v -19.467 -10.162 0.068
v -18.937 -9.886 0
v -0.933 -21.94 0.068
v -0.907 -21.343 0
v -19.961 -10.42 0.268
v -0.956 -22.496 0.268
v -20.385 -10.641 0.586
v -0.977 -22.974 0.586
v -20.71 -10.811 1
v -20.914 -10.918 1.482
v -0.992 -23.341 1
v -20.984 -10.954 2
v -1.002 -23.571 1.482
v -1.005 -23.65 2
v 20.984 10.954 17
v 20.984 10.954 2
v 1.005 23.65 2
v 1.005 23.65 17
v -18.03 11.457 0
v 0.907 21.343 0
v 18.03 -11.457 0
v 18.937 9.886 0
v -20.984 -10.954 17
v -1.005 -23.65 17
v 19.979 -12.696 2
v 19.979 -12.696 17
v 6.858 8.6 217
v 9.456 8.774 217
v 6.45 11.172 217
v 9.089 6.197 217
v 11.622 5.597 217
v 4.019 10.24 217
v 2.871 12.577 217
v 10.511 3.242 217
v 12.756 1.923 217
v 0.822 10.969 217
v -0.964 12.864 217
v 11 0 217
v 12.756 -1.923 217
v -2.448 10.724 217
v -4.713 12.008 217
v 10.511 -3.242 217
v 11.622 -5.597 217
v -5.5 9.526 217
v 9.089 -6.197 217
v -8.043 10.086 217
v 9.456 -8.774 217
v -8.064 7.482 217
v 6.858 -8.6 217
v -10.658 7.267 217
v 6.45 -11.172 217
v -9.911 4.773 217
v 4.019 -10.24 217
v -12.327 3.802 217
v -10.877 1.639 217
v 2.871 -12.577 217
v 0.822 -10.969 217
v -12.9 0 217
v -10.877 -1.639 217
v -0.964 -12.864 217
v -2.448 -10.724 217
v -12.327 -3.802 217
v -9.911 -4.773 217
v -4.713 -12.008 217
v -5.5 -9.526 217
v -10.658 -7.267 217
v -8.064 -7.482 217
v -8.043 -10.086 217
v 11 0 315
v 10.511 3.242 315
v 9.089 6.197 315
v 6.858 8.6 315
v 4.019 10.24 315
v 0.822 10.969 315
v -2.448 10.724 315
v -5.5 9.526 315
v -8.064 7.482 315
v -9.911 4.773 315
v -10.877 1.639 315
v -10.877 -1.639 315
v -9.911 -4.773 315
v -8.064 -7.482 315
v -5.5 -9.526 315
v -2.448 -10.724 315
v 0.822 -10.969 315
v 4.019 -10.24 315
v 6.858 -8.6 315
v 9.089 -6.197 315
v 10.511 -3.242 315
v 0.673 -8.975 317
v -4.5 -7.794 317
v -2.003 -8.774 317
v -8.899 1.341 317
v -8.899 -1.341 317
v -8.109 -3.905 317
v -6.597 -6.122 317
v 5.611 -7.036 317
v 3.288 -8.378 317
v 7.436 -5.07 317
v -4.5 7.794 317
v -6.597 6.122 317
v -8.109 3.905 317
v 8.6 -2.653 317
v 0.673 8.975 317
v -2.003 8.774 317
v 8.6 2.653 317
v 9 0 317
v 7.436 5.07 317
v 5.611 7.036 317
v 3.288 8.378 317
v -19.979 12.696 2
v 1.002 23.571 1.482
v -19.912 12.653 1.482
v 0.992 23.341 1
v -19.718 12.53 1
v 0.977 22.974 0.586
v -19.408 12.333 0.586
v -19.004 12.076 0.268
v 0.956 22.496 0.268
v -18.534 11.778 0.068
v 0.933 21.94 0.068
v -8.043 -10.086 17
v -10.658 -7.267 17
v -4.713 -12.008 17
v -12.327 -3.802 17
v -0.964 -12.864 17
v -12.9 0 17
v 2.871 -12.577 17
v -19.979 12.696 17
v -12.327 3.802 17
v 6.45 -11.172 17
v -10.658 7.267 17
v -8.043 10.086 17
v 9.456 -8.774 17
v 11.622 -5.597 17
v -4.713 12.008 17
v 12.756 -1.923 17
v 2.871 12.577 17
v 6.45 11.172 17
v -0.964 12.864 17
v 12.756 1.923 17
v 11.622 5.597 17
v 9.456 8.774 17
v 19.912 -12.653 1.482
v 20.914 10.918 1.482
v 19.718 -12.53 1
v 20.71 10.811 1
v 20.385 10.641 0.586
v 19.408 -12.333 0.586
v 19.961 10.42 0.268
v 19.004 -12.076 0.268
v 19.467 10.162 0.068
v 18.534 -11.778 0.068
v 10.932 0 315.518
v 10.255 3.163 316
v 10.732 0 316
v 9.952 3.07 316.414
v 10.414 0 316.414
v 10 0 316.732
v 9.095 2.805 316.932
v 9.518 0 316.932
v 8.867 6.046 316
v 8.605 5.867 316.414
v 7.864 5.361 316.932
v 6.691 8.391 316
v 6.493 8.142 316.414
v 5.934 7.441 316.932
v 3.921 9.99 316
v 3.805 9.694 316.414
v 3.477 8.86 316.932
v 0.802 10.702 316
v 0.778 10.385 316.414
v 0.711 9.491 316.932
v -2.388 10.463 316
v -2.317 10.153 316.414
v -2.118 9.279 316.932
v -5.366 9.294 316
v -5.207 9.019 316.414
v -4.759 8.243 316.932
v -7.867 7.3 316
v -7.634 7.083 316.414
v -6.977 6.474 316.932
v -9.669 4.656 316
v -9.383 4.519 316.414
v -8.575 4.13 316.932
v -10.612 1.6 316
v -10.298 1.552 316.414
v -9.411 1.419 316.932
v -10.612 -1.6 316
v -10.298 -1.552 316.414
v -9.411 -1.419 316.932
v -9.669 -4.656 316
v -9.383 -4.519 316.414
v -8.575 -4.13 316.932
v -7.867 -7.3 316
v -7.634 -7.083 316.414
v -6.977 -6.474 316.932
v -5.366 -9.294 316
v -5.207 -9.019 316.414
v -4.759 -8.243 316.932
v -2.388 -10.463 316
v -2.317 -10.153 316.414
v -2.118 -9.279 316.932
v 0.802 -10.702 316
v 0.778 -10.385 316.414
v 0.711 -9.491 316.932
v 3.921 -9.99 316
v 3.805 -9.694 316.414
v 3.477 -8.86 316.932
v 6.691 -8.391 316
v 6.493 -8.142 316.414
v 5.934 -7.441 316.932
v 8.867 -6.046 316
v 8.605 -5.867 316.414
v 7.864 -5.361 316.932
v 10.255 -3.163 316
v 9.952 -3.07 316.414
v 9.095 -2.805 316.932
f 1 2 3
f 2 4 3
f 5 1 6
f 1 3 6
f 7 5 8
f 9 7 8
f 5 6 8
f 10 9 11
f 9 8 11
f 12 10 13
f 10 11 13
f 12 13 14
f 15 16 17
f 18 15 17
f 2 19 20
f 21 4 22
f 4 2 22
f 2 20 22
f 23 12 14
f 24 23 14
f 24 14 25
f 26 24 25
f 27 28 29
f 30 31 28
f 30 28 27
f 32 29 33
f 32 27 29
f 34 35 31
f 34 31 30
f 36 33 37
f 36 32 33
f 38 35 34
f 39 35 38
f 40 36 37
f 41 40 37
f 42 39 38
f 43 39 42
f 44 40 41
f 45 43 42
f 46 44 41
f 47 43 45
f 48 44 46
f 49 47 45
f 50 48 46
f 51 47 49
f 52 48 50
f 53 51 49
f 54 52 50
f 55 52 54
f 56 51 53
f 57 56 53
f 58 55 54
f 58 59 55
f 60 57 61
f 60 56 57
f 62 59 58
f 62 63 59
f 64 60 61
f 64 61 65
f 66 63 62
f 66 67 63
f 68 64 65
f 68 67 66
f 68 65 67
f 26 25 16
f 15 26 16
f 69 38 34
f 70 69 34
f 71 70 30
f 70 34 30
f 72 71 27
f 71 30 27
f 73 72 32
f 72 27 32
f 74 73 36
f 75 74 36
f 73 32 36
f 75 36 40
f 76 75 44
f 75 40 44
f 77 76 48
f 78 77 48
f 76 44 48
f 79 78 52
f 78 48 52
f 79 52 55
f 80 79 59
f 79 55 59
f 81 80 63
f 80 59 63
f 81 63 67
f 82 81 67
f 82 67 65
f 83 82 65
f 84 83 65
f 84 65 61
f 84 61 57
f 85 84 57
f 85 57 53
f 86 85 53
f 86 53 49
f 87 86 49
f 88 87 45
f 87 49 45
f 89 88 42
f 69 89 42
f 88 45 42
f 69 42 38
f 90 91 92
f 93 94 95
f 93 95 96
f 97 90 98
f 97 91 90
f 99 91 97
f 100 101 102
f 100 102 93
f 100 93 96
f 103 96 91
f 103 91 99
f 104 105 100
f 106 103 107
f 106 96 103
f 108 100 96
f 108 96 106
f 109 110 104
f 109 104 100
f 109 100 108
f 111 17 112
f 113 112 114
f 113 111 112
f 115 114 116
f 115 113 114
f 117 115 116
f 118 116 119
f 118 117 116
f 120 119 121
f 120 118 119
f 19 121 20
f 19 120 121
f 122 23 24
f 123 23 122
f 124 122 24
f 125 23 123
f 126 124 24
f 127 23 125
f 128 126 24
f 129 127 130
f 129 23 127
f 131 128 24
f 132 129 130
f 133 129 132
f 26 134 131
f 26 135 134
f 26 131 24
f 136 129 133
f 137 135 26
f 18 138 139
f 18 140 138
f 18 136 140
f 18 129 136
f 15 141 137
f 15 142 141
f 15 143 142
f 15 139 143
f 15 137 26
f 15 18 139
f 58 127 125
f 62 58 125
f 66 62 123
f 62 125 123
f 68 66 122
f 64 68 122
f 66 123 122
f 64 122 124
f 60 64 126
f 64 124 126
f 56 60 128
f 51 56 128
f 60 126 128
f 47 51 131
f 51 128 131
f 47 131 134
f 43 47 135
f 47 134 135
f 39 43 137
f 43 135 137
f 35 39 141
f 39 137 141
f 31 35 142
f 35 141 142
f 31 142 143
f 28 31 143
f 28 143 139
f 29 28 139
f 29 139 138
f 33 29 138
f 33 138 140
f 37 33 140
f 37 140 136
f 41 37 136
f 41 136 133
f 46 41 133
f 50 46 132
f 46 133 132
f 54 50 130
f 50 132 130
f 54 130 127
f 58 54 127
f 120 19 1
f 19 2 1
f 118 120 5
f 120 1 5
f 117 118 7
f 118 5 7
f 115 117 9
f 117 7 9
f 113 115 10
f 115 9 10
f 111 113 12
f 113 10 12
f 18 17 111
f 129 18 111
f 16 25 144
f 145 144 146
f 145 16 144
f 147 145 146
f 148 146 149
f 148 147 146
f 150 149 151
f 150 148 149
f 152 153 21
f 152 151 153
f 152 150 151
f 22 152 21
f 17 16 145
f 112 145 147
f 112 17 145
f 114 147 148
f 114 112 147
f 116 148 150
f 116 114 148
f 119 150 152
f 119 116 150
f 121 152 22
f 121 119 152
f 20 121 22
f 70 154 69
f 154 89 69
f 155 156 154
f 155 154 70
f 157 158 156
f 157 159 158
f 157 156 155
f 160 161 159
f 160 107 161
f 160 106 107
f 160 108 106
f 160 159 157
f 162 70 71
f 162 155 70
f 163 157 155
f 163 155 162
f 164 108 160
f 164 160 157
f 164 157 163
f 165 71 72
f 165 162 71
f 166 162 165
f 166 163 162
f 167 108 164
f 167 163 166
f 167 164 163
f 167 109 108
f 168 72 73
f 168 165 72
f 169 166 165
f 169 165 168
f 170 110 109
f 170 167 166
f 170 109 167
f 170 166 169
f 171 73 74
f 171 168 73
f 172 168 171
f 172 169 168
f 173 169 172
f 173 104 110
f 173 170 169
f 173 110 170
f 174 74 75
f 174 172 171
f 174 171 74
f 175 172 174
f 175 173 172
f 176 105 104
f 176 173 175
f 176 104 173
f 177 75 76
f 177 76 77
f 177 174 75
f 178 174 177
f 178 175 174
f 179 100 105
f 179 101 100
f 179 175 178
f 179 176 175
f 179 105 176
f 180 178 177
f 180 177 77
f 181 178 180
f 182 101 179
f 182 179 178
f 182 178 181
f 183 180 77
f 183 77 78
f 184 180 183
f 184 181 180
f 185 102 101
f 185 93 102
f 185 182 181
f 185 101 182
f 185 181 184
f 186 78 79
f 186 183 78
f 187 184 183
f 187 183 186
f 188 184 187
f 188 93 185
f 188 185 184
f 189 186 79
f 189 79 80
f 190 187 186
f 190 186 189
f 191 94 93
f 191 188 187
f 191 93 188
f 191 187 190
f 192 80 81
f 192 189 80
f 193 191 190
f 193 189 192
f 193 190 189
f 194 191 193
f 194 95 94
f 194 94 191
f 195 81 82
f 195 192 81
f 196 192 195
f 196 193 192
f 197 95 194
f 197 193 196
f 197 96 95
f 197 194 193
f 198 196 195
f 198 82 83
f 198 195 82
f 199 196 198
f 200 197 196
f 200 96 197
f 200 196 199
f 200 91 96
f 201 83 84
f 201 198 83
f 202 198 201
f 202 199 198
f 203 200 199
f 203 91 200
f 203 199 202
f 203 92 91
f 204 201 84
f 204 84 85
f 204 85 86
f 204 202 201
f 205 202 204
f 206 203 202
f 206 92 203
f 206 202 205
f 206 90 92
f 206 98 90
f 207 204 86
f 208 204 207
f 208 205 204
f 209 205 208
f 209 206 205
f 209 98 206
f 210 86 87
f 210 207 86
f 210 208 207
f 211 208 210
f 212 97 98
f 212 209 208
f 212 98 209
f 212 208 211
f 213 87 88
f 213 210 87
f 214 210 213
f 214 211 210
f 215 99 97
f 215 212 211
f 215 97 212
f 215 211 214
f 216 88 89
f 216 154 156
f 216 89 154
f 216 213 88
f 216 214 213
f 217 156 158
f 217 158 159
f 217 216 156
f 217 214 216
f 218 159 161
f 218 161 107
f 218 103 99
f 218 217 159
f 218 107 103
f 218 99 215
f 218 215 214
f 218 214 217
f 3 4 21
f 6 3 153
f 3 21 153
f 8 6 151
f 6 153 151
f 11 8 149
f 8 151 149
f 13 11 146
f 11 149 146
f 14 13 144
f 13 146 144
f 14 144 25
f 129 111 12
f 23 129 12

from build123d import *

# Parameters (mm, degrees)
EXTRUDE_275_DEPTH = 17
SKETCH_2_R        = 12.9
EXTRUDE_1_DEPTH   = 200
FILLET_3_R        = 2
SKETCH_3_R        = 11
EXTRUDE_2_DEPTH   = 100
FILLET_4_R        = 2


with BuildPart() as part:
    # 草图1 → Extrude 275 (new body)
    with BuildSketch(Plane.XY):
        Polygon((20.984201837, 10.954296262), (1.005402075, 23.65), (-19.978799762, 12.695703738), (-20.984201837, -10.954296262), (-1.005402075, -23.65), (19.978799762, -12.695703738), align=None)
    extrude(amount=EXTRUDE_275_DEPTH)

    # 草图2 → 凸台-拉伸1 (add)
    with BuildSketch(Plane.XY.offset(17)):
        with Locations(Location((0, 0, 0), (0, 0, 180))):
            Circle(SKETCH_2_R)
    extrude(amount=EXTRUDE_1_DEPTH)

    # 圆角3
    fillet_3_edges = [part.edges().sort_by_distance(p)[0] for p in [
        (9.486698843, -18.172851869, 0),
        (-10.994801956, -17.302148131, 0),
        (-20.4815008, 0.870703738, 0),
        (-9.486698843, 18.172851869, 0),
        (10.994801956, 17.302148131, 0),
        (20.4815008, -0.870703738, 0),
    ]]
    fillet(fillet_3_edges, radius=FILLET_3_R)

    # 草图3 → 凸台-拉伸2 (add)
    with BuildSketch(Plane.XY.offset(217)):
        Circle(SKETCH_3_R)
    extrude(amount=EXTRUDE_2_DEPTH)

    # 圆角4
    fillet_4_edges = [part.edges().sort_by_distance(p)[0] for p in [
        (-11, 0, 317),
    ]]
    fillet(fillet_4_edges, radius=FILLET_4_R)


solid = part.part
